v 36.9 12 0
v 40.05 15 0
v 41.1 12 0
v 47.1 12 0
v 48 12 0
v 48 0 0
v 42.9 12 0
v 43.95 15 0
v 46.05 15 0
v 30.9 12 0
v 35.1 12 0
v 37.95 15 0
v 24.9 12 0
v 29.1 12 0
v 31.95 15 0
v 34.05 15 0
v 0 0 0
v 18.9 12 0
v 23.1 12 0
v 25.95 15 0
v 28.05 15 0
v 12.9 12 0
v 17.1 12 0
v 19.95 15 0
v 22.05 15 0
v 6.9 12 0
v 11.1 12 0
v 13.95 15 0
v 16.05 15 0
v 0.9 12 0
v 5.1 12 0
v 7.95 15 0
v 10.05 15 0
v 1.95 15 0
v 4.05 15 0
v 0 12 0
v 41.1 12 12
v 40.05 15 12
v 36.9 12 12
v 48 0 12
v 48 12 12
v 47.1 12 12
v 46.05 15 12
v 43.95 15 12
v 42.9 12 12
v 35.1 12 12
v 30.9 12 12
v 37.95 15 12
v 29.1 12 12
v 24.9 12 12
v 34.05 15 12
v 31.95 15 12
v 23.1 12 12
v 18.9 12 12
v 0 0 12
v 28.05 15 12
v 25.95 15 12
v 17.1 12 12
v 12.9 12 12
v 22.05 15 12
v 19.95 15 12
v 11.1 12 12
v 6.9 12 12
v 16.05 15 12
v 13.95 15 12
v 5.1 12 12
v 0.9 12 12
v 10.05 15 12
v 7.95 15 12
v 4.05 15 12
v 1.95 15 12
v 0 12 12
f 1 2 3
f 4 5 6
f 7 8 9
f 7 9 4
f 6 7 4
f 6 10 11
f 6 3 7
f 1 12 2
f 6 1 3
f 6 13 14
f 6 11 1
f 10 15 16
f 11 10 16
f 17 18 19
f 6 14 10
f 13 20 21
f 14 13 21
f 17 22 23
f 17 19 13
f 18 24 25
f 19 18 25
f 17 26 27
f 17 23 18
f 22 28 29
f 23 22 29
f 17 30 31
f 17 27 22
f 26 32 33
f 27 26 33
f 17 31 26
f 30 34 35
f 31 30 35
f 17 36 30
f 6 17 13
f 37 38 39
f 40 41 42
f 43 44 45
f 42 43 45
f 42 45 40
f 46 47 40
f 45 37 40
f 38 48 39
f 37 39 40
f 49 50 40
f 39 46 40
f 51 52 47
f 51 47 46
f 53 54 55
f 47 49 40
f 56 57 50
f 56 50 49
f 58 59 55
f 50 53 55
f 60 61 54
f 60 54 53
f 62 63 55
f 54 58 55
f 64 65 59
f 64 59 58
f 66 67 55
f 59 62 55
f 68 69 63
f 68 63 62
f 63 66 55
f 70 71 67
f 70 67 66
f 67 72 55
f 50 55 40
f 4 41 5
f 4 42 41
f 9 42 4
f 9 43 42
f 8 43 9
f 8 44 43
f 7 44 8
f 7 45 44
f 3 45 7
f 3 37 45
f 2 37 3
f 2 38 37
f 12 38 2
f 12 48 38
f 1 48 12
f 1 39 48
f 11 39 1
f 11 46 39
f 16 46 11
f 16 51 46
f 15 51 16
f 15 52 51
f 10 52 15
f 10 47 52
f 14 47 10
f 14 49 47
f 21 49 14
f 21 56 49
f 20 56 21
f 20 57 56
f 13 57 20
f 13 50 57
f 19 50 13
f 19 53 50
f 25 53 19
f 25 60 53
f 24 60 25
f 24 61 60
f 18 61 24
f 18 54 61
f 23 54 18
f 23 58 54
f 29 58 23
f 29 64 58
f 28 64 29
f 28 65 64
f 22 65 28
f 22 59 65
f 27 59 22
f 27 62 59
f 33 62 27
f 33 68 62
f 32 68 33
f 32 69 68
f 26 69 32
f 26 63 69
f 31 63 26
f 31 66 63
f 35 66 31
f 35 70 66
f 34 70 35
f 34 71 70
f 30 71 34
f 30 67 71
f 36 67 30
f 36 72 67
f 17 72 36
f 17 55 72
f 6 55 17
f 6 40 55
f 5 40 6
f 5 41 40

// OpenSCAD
$fn = 32;

// ----------------------------------------------------------------------
// Gear rack: 8 teeth, pitch 6 mm
// ----------------------------------------------------------------------

// --- parameters (mm) ---
teeth = 8;                // number of teeth
pitch = 6;                // tooth pitch, X
root_w = 4.2;             // tooth width at the root
tip_w = 2.1;              // tooth width at the tip
base_h = 12;              // rack body height, Y
tooth_h = 3;              // tooth height above the body
plate_t = 12;             // rack width, Z (extrusion height)

rack_l = teeth * pitch;  // overall length
total_h = base_h + tooth_h;  // overall height

profile = [[0, 0], [48, 0], [48, 12], [47.1, 12], [46.05, 15], [43.95, 15], [42.9, 12], [41.1, 12], [40.05, 15], [37.95, 15], [36.9, 12], [35.1, 12], [34.05, 15], [31.95, 15], [30.9, 12], [29.1, 12], [28.05, 15], [25.95, 15], [24.9, 12], [23.1, 12], [22.05, 15], [19.95, 15], [18.9, 12], [17.1, 12], [16.05, 15], [13.95, 15], [12.9, 12], [11.1, 12], [10.05, 15], [7.95, 15], [6.9, 12], [5.1, 12], [4.05, 15], [1.95, 15], [0.9, 12], [0, 12]];  // primary outline, 36 points, counter clockwise

// --- the one profile operation ---
linear_extrude(height = plate_t) polygon(points = profile);
